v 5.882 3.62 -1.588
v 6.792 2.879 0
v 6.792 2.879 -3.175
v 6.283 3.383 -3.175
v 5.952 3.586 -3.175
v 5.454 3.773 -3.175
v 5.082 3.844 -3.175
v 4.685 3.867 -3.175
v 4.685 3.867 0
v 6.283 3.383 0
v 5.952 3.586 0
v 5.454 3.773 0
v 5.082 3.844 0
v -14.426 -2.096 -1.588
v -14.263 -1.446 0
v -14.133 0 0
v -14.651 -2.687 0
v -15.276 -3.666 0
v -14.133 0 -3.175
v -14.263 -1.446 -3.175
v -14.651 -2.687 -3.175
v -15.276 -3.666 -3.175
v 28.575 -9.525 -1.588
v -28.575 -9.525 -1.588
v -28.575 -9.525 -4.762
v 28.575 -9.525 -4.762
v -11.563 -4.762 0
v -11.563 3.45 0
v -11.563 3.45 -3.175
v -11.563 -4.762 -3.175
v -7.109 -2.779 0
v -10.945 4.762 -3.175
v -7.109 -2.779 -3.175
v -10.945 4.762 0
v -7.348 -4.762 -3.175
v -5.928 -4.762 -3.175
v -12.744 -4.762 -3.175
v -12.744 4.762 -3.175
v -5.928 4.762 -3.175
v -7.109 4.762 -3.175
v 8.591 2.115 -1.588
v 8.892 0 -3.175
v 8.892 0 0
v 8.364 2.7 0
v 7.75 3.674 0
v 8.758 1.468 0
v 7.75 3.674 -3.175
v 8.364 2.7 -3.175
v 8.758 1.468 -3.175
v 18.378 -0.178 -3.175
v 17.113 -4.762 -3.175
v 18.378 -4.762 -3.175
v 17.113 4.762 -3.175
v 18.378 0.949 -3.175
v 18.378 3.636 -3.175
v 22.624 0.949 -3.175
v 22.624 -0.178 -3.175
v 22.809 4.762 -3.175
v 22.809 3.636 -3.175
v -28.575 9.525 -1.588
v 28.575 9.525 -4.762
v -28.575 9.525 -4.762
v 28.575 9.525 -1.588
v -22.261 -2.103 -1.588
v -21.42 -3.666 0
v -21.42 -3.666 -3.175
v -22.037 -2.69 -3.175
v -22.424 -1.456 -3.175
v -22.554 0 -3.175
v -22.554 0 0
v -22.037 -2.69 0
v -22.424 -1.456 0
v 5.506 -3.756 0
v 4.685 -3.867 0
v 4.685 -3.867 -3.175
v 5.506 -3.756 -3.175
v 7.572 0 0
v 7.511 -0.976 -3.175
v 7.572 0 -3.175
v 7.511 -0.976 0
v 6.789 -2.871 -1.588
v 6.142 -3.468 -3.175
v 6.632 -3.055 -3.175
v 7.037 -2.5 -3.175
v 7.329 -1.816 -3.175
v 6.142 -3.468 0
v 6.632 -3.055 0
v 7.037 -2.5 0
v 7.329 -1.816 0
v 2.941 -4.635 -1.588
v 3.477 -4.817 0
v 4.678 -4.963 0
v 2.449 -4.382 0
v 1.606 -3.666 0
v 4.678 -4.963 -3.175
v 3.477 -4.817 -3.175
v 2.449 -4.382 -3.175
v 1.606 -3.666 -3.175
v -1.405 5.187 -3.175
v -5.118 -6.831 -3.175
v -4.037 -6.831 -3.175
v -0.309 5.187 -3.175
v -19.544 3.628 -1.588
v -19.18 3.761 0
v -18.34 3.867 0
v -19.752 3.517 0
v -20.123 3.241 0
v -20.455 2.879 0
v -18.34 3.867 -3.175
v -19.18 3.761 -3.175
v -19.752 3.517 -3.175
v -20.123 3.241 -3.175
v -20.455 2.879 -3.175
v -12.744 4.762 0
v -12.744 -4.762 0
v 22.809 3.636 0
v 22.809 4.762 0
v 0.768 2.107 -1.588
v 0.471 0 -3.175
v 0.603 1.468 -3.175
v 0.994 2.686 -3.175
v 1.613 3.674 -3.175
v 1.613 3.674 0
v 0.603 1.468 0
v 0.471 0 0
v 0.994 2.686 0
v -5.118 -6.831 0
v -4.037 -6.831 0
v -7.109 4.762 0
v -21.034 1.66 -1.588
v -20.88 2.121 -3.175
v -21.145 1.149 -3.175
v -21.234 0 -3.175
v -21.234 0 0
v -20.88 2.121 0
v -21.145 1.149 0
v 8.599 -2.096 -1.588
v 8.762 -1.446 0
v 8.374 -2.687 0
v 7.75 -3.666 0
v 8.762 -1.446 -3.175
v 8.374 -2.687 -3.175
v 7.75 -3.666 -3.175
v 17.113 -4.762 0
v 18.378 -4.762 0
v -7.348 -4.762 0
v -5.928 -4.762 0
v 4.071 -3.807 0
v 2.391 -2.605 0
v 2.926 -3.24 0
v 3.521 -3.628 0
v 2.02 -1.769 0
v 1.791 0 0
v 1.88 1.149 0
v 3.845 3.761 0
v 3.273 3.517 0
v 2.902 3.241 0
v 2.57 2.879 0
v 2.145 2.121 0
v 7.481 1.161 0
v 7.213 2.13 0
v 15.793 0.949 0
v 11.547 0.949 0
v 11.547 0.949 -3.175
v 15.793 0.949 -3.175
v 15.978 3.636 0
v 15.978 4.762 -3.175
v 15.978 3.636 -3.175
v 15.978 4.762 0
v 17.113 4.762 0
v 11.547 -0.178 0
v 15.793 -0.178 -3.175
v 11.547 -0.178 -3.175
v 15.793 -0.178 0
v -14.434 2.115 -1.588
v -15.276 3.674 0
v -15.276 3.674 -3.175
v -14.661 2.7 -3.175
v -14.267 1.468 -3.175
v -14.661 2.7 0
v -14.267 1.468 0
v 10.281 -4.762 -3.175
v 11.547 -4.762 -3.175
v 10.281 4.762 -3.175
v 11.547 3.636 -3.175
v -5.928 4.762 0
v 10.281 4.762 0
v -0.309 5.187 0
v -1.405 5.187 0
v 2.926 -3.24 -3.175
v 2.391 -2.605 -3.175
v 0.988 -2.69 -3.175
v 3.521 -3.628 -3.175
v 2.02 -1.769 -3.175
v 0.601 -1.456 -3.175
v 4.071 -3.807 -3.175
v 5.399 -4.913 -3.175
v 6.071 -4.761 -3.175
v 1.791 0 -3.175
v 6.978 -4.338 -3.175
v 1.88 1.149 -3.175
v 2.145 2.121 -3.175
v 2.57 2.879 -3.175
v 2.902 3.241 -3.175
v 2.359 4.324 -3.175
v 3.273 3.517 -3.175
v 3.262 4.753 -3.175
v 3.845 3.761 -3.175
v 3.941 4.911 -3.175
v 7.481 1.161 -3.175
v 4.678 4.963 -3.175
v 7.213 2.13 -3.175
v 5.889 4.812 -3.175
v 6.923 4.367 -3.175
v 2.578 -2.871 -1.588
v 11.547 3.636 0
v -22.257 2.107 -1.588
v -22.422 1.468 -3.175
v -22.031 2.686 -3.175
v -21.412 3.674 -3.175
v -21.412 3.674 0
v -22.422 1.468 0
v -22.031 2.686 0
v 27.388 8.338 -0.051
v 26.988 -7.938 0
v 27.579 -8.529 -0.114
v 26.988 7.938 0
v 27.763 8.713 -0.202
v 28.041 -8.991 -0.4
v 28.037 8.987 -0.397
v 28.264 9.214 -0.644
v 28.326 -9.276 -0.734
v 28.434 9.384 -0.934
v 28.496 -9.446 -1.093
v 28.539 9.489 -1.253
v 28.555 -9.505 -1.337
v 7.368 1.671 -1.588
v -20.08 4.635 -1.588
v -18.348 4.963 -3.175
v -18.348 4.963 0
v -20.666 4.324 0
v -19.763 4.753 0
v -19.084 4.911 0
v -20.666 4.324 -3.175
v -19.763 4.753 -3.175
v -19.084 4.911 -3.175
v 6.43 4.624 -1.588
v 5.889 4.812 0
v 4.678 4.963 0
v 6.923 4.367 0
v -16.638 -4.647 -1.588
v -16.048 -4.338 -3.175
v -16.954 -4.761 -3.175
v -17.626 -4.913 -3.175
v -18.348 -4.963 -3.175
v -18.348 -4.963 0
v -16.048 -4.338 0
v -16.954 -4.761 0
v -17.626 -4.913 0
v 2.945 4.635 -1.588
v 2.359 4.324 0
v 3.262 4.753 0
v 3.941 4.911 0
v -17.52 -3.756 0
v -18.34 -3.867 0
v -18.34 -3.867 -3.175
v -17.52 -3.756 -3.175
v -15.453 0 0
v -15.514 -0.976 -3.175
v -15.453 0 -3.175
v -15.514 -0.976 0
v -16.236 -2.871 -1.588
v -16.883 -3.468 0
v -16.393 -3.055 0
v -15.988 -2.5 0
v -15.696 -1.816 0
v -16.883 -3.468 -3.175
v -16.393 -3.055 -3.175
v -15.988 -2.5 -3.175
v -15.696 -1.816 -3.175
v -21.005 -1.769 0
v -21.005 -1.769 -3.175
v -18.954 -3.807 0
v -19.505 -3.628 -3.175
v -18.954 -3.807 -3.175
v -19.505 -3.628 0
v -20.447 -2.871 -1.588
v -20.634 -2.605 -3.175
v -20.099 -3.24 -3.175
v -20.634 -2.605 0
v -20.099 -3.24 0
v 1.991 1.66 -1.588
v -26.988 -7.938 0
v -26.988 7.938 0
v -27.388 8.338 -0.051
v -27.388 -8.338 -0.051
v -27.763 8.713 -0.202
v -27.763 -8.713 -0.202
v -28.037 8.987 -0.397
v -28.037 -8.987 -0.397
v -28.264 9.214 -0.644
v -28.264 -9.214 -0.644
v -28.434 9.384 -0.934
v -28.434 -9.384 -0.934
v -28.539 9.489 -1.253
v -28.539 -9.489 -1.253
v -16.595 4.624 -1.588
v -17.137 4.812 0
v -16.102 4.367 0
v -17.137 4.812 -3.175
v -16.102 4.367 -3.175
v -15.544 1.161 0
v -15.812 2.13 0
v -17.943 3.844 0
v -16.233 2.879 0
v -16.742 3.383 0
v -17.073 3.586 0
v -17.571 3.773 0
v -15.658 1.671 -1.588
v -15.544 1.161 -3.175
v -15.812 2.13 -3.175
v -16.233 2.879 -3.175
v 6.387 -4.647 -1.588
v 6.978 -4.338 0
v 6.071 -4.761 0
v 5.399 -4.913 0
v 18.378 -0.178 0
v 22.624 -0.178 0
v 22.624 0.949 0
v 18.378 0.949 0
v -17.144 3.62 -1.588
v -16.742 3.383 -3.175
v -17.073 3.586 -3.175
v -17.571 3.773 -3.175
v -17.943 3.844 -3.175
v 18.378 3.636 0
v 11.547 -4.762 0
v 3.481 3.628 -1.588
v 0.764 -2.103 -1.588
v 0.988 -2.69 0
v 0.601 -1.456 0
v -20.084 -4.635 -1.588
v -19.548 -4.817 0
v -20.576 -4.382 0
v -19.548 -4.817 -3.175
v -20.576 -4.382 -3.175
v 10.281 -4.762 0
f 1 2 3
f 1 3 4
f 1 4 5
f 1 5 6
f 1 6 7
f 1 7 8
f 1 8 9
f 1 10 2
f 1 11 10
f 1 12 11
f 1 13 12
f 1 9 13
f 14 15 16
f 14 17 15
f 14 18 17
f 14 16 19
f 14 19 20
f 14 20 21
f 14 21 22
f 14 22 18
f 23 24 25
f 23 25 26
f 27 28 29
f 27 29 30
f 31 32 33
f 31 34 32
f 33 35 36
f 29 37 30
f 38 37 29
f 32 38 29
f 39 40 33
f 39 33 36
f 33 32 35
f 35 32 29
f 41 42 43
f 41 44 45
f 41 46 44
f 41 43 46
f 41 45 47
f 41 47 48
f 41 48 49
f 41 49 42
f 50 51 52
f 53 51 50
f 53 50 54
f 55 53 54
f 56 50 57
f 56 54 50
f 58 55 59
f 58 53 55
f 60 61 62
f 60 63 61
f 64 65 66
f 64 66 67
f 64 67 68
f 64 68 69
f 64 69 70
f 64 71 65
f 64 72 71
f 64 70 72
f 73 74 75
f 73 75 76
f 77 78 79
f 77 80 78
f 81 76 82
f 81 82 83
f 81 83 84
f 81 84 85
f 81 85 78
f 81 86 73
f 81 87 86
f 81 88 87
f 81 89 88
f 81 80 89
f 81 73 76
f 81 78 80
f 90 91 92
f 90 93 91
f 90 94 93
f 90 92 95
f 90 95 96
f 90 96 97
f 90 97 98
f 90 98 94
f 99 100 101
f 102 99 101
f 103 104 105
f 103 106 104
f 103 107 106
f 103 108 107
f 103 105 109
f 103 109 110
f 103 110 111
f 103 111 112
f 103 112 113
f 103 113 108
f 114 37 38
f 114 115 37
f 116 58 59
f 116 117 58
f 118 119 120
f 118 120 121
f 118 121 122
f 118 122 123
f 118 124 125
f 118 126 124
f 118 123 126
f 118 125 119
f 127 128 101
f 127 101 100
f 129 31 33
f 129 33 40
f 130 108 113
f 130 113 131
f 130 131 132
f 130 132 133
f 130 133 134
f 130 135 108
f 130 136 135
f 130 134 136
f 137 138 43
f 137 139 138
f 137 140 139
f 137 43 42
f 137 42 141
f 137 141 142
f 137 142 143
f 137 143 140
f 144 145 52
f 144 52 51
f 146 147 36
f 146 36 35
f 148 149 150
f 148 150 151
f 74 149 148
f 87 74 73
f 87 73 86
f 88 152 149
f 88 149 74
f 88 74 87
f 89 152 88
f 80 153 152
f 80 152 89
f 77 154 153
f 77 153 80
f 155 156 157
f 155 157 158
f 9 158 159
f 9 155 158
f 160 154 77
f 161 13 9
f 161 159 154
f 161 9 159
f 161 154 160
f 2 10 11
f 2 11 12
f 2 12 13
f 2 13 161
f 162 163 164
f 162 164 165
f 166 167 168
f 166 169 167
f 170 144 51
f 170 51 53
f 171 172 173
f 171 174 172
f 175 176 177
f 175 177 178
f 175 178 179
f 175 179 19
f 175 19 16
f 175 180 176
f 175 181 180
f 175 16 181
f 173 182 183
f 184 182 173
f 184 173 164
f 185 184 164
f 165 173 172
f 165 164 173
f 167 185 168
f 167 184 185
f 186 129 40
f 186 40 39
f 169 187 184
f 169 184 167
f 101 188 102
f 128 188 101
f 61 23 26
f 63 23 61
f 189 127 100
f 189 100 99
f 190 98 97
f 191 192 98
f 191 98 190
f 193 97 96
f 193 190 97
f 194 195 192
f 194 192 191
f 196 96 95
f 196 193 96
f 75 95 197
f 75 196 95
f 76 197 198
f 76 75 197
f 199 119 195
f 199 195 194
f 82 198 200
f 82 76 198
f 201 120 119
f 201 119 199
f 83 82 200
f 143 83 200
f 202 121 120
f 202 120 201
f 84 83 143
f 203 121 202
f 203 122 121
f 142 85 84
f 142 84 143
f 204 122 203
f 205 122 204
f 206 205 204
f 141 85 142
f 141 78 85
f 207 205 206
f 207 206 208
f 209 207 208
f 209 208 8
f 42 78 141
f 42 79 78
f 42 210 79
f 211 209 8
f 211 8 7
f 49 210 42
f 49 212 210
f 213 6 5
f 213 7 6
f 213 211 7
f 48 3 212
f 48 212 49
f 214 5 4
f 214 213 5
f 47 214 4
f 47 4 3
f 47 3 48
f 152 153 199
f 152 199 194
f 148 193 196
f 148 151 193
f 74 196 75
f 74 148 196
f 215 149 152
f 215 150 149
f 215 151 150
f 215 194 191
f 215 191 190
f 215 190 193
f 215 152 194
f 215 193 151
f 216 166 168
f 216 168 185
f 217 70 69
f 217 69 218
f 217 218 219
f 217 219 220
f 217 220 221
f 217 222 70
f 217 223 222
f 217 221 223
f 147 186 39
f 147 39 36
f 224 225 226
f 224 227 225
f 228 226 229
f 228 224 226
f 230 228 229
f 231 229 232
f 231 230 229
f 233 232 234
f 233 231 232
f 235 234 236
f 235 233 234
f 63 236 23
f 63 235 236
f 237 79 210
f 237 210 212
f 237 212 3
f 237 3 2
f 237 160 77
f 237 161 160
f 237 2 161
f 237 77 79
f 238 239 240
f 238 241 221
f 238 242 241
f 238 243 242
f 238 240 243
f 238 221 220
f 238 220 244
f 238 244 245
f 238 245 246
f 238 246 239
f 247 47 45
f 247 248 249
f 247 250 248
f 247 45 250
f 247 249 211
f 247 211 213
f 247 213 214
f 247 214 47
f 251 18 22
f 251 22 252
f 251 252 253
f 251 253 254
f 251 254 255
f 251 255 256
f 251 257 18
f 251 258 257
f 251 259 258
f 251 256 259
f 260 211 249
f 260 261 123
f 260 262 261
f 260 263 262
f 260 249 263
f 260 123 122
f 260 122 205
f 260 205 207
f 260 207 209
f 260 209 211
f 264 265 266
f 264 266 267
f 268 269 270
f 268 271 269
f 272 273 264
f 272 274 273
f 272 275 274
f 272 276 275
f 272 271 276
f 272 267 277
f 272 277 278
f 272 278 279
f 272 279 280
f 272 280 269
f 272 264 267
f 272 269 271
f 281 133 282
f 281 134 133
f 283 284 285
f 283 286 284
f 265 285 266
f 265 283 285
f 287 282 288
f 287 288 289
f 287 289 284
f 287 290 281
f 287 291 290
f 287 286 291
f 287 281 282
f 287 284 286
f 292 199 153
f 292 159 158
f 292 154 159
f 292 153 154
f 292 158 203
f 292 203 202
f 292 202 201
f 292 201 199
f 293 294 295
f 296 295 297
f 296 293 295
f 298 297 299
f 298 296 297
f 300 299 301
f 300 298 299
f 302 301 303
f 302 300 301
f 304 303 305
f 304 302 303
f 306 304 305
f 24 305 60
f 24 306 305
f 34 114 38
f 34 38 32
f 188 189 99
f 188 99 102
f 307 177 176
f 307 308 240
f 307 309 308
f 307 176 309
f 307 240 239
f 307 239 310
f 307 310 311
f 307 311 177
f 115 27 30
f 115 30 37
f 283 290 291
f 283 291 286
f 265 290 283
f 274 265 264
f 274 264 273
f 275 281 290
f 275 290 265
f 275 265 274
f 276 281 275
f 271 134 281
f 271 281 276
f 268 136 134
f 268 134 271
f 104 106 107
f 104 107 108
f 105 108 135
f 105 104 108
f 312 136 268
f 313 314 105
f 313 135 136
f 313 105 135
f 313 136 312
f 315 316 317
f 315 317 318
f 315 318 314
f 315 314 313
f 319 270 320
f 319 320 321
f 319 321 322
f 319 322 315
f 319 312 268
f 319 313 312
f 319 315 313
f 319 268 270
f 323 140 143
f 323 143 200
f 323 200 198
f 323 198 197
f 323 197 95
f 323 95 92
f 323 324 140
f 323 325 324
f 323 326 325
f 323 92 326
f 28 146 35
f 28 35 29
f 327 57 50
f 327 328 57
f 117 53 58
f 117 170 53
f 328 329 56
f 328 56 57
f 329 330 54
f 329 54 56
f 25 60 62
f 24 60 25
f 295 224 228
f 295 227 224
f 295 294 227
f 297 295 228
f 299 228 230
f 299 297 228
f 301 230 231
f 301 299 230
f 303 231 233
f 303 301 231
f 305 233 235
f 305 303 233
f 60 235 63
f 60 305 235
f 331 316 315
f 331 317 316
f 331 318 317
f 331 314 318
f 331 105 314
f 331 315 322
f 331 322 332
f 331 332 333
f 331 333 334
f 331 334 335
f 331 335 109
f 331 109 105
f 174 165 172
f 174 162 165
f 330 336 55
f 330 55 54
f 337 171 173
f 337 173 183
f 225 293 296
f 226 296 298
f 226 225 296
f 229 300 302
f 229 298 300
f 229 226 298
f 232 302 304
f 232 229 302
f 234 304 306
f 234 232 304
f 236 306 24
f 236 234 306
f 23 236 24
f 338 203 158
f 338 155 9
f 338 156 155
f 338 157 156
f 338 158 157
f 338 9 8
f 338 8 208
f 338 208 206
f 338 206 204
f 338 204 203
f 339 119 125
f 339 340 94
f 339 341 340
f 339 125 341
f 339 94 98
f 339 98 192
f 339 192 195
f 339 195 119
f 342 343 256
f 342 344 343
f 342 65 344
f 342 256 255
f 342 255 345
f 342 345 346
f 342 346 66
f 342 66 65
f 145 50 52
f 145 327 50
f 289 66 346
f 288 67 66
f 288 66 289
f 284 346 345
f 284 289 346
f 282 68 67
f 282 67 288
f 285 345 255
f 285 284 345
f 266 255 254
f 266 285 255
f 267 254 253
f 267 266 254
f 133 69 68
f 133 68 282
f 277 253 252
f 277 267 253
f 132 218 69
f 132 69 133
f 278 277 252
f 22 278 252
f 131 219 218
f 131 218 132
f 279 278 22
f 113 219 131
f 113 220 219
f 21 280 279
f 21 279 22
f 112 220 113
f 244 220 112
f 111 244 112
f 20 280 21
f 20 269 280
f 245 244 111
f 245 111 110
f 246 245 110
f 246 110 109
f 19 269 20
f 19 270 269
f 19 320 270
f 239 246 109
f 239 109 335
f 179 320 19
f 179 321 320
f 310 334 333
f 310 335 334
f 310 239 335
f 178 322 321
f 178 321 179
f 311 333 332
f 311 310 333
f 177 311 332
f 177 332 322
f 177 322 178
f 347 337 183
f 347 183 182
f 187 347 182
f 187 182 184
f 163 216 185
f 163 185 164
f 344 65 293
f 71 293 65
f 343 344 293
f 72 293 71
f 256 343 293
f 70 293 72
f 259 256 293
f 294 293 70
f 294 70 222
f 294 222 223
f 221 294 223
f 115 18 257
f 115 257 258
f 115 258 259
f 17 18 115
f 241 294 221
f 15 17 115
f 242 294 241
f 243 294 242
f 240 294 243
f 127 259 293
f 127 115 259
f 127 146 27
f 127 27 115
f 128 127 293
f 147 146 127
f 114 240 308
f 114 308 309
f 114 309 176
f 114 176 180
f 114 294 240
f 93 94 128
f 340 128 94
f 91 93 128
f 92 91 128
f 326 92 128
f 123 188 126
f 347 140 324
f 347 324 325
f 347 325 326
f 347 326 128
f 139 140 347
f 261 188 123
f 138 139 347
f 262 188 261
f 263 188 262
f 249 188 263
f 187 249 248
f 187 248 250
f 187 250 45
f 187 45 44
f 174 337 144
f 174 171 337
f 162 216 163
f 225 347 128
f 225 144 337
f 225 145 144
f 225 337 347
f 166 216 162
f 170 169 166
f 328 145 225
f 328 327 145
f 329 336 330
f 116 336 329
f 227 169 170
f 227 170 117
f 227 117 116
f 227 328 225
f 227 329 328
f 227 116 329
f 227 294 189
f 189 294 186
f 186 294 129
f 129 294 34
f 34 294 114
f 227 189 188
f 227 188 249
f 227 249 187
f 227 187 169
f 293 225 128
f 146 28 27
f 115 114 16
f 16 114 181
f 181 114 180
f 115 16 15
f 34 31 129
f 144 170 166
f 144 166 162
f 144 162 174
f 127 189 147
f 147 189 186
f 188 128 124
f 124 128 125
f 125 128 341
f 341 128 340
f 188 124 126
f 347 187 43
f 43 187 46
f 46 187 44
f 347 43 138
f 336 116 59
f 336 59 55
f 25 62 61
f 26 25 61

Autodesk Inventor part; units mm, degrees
ref_plane "YZ Plane" through (0, 0, 0) normal (1, 0, 0) x (0, 1, 0)
ref_plane "XZ Plane" through (0, 0, 0) normal (0, 1, 0) x (-1, 0, 0)
ref_plane "XY Plane" through (0, 0, 0) normal (0, 0, 1) x (1, 0, 0)
sketch "Sketch1" plane through (0, 0, 0) normal (0, 0, 1) x (1, 0, 0)
  line L0 (-28.575, -9.525) -> (28.575, -9.525)
  line L1 (28.575, -9.525) -> (28.575, 9.525)
  line L2 (28.575, 9.525) -> (-28.575, 9.525)
  line L3 (-28.575, 9.525) -> (-28.575, -9.525)
  line L4 (-28.575, -9.525) -> (28.575, 9.525) construction
  line L5 (28.575, -9.525) -> (-28.575, 9.525) construction
  point P0 (0, 0)
  dimension "d0" = 57.15
  dimension "d1" = 19.05
extrude "Extrusion1" add sketch "Sketch1" against normal blind 4.7625
sketch "Sketch2" plane through (0, 0, 0) normal (0, 0, 1) x (1, 0, 0)
  line L0 (-28.575, -9.525) -> (-28.575, 9.525) construction
  line L1 (-28.575, 0) -> (28.575, 0) construction
  line L2 (28.575, 9.525) -> (28.575, -9.525) construction
  spline S0 degree 2 poles (-15.2755, 3.6741) (-14.7352, 3.0412) (-14.1331, 1.1887) (-14.1331, 0) knots 0 0 0 1 2 2 2
  spline S1 degree 2 poles (-14.1331, 0) (-14.1331, -1.1578) (-14.7198, -3.0335) (-15.2755, -3.6664) knots 0 0 0 1 2 2 2
  spline S2 degree 2 poles (-15.2755, -3.6664) (-15.8621, -4.3302) (-17.4136, -4.9632) (-18.3476, -4.9632) knots 0 0 0 1 2 2 2
  spline S3 degree 2 poles (-18.3476, -4.9632) (-19.3124, -4.9632) (-20.8562, -4.3071) (-21.4197, -3.6664) knots 0 0 0 1 2 2 2
  spline S4 degree 2 poles (-21.4197, -3.6664) (-21.9677, -3.0335) (-22.5543, -1.1733) (-22.5543, 0) knots 0 0 0 1 2 2 2
  spline S5 degree 2 poles (-22.5543, 0) (-22.5543, 1.1964) (-21.96, 3.0181) (-21.412, 3.6741) knots 0 0 0 1 2 2 2
  spline S6 degree 2 poles (-21.412, 3.6741) (-20.8562, 4.3071) (-19.3047, 4.9632) (-18.3476, 4.9632) knots 0 0 0 1 2 2 2
  spline S7 degree 2 poles (-18.3476, 4.9632) (-17.375, 4.9632) (-15.8158, 4.2839) (-15.2755, 3.6741) knots 0 0 0 1 2 2 2
  spline S8 degree 2 poles (-15.453, 0) (-15.453, 0.9417) (-15.8621, 2.4005) (-16.2326, 2.8791) knots 0 0 0 1 2 2 2
  spline S9 degree 2 poles (-16.2326, 2.8791) (-16.6109, 3.3731) (-17.6761, 3.8671) (-18.3399, 3.8671) knots 0 0 0 1 2 2 2
  spline S10 degree 2 poles (-18.3399, 3.8671) (-19.0268, 3.8671) (-20.0612, 3.3886) (-20.4548, 2.8791) knots 0 0 0 1 2 2 2
  spline S11 degree 2 poles (-20.4548, 2.8791) (-20.833, 2.3928) (-21.2344, 0.9263) (-21.2344, 0) knots 0 0 0 1 2 2 2
  spline S12 degree 2 poles (-21.2344, 0) (-21.2344, -1.8757) (-19.6598, -3.8671) (-18.3399, -3.8671) knots 0 0 0 1 2 2 2
  spline S13 degree 2 poles (-18.3399, -3.8671) (-17.02, -3.8671) (-15.453, -1.8757) (-15.453, 0) knots 0 0 0 1 2 2 2
  line L3 (-5.928, -4.7625) -> (-7.3483, -4.7625)
  line L4 (-7.3483, -4.7625) -> (-11.5628, 3.4503)
  line L5 (-11.5628, 3.4503) -> (-11.5628, -4.7625)
  line L6 (-11.5628, -4.7625) -> (-12.7437, -4.7625)
  line L7 (-12.7437, -4.7625) -> (-12.7437, 4.7625)
  line L8 (-12.7437, 4.7625) -> (-10.9453, 4.7625)
  line L9 (-10.9453, 4.7625) -> (-7.109, -2.7788)
  line L10 (-7.109, -2.7788) -> (-7.109, 4.7625)
  line L11 (-7.109, 4.7625) -> (-5.928, 4.7625)
  line L12 (-5.928, 4.7625) -> (-5.928, -4.7625)
  line L13 (-0.3088, 5.187) -> (-4.0369, -6.8311)
  line L14 (-4.0369, -6.8311) -> (-5.1176, -6.8311)
  line L15 (-5.1176, -6.8311) -> (-1.4048, 5.187)
  line L16 (-1.4048, 5.187) -> (-0.3088, 5.187)
  spline S14 degree 2 poles (7.7497, 3.6741) (8.29, 3.0412) (8.8921, 1.1887) (8.8921, 0) knots 0 0 0 1 2 2 2
  spline S15 degree 2 poles (8.8921, 0) (8.8921, -1.1578) (8.3054, -3.0335) (7.7497, -3.6664) knots 0 0 0 1 2 2 2
  spline S16 degree 2 poles (7.7497, -3.6664) (7.163, -4.3302) (5.6116, -4.9632) (4.6776, -4.9632) knots 0 0 0 1 2 2 2
  spline S17 degree 2 poles (4.6776, -4.9632) (3.7127, -4.9632) (2.169, -4.3071) (1.6055, -3.6664) knots 0 0 0 1 2 2 2
  spline S18 degree 2 poles (1.6055, -3.6664) (1.0575, -3.0335) (0.4708, -1.1733) (0.4708, 0) knots 0 0 0 1 2 2 2
  spline S19 degree 2 poles (0.4708, 0) (0.4708, 1.1964) (1.0652, 3.0181) (1.6132, 3.6741) knots 0 0 0 1 2 2 2
  spline S20 degree 2 poles (1.6132, 3.6741) (2.169, 4.3071) (3.7205, 4.9632) (4.6776, 4.9632) knots 0 0 0 1 2 2 2
  spline S21 degree 2 poles (4.6776, 4.9632) (5.6502, 4.9632) (7.2094, 4.2839) (7.7497, 3.6741) knots 0 0 0 1 2 2 2
  spline S22 degree 2 poles (7.5721, 0) (7.5721, 0.9417) (7.163, 2.4005) (6.7925, 2.8791) knots 0 0 0 1 2 2 2
  spline S23 degree 2 poles (6.7925, 2.8791) (6.4143, 3.3731) (5.3491, 3.8671) (4.6853, 3.8671) knots 0 0 0 1 2 2 2
  spline S24 degree 2 poles (4.6853, 3.8671) (3.9983, 3.8671) (2.964, 3.3886) (2.5704, 2.8791) knots 0 0 0 1 2 2 2
  spline S25 degree 2 poles (2.5704, 2.8791) (2.1921, 2.3928) (1.7908, 0.9263) (1.7908, 0) knots 0 0 0 1 2 2 2
  spline S26 degree 2 poles (1.7908, 0) (1.7908, -1.8757) (3.3654, -3.8671) (4.6853, -3.8671) knots 0 0 0 1 2 2 2
  spline S27 degree 2 poles (4.6853, -3.8671) (6.0052, -3.8671) (7.5721, -1.8757) (7.5721, 0) knots 0 0 0 1 2 2 2
  line L17 (15.9779, 3.6356) -> (11.5473, 3.6356)
  line L18 (11.5473, 3.6356) -> (11.5473, 0.9494)
  line L19 (11.5473, 0.9494) -> (15.7927, 0.9494)
  line L20 (15.7927, 0.9494) -> (15.7927, -0.1775)
  line L21 (15.7927, -0.1775) -> (11.5473, -0.1775)
  line L22 (11.5473, -0.1775) -> (11.5473, -4.7625)
  line L23 (11.5473, -4.7625) -> (10.2814, -4.7625)
  line L24 (10.2814, -4.7625) -> (10.2814, 4.7625)
  line L25 (10.2814, 4.7625) -> (15.9779, 4.7625)
  line L26 (15.9779, 4.7625) -> (15.9779, 3.6356)
  line L27 (22.8091, 3.6356) -> (18.3785, 3.6356)
  line L28 (18.3785, 3.6356) -> (18.3785, 0.9494)
  line L29 (18.3785, 0.9494) -> (22.6238, 0.9494)
  line L30 (22.6238, 0.9494) -> (22.6238, -0.1775)
  line L31 (22.6238, -0.1775) -> (18.3785, -0.1775)
  line L32 (18.3785, -0.1775) -> (18.3785, -4.7625)
  line L33 (18.3785, -4.7625) -> (17.1126, -4.7625)
  line L34 (17.1126, -4.7625) -> (17.1126, 4.7625)
  line L35 (17.1126, 4.7625) -> (22.8091, 4.7625)
  line L36 (22.8091, 4.7625) -> (22.8091, 3.6356)
  point P0 (0, 0)
extrude "Extrusion2" cut sketch "Sketch2" against normal blind 3.175
fillet "Fillet1" radius 1.5875 4 edges at (0, 9.525, 0) (28.575, 0, 0) (0, -9.525, 0) (-28.575, 0, 0)
equation "\"d0\" = width"
equation "\"d1\" = height"
equation "\"d2\" = depth"
equation "\"d13\" = textDepth"
equation "\"width\" = 57.15"
equation "\"height\" = 19.05"
equation "\"depth\" = 4.7625"
equation "\"textDepth\" = 0.666667 * depth"
properties part number "onOffSign"
